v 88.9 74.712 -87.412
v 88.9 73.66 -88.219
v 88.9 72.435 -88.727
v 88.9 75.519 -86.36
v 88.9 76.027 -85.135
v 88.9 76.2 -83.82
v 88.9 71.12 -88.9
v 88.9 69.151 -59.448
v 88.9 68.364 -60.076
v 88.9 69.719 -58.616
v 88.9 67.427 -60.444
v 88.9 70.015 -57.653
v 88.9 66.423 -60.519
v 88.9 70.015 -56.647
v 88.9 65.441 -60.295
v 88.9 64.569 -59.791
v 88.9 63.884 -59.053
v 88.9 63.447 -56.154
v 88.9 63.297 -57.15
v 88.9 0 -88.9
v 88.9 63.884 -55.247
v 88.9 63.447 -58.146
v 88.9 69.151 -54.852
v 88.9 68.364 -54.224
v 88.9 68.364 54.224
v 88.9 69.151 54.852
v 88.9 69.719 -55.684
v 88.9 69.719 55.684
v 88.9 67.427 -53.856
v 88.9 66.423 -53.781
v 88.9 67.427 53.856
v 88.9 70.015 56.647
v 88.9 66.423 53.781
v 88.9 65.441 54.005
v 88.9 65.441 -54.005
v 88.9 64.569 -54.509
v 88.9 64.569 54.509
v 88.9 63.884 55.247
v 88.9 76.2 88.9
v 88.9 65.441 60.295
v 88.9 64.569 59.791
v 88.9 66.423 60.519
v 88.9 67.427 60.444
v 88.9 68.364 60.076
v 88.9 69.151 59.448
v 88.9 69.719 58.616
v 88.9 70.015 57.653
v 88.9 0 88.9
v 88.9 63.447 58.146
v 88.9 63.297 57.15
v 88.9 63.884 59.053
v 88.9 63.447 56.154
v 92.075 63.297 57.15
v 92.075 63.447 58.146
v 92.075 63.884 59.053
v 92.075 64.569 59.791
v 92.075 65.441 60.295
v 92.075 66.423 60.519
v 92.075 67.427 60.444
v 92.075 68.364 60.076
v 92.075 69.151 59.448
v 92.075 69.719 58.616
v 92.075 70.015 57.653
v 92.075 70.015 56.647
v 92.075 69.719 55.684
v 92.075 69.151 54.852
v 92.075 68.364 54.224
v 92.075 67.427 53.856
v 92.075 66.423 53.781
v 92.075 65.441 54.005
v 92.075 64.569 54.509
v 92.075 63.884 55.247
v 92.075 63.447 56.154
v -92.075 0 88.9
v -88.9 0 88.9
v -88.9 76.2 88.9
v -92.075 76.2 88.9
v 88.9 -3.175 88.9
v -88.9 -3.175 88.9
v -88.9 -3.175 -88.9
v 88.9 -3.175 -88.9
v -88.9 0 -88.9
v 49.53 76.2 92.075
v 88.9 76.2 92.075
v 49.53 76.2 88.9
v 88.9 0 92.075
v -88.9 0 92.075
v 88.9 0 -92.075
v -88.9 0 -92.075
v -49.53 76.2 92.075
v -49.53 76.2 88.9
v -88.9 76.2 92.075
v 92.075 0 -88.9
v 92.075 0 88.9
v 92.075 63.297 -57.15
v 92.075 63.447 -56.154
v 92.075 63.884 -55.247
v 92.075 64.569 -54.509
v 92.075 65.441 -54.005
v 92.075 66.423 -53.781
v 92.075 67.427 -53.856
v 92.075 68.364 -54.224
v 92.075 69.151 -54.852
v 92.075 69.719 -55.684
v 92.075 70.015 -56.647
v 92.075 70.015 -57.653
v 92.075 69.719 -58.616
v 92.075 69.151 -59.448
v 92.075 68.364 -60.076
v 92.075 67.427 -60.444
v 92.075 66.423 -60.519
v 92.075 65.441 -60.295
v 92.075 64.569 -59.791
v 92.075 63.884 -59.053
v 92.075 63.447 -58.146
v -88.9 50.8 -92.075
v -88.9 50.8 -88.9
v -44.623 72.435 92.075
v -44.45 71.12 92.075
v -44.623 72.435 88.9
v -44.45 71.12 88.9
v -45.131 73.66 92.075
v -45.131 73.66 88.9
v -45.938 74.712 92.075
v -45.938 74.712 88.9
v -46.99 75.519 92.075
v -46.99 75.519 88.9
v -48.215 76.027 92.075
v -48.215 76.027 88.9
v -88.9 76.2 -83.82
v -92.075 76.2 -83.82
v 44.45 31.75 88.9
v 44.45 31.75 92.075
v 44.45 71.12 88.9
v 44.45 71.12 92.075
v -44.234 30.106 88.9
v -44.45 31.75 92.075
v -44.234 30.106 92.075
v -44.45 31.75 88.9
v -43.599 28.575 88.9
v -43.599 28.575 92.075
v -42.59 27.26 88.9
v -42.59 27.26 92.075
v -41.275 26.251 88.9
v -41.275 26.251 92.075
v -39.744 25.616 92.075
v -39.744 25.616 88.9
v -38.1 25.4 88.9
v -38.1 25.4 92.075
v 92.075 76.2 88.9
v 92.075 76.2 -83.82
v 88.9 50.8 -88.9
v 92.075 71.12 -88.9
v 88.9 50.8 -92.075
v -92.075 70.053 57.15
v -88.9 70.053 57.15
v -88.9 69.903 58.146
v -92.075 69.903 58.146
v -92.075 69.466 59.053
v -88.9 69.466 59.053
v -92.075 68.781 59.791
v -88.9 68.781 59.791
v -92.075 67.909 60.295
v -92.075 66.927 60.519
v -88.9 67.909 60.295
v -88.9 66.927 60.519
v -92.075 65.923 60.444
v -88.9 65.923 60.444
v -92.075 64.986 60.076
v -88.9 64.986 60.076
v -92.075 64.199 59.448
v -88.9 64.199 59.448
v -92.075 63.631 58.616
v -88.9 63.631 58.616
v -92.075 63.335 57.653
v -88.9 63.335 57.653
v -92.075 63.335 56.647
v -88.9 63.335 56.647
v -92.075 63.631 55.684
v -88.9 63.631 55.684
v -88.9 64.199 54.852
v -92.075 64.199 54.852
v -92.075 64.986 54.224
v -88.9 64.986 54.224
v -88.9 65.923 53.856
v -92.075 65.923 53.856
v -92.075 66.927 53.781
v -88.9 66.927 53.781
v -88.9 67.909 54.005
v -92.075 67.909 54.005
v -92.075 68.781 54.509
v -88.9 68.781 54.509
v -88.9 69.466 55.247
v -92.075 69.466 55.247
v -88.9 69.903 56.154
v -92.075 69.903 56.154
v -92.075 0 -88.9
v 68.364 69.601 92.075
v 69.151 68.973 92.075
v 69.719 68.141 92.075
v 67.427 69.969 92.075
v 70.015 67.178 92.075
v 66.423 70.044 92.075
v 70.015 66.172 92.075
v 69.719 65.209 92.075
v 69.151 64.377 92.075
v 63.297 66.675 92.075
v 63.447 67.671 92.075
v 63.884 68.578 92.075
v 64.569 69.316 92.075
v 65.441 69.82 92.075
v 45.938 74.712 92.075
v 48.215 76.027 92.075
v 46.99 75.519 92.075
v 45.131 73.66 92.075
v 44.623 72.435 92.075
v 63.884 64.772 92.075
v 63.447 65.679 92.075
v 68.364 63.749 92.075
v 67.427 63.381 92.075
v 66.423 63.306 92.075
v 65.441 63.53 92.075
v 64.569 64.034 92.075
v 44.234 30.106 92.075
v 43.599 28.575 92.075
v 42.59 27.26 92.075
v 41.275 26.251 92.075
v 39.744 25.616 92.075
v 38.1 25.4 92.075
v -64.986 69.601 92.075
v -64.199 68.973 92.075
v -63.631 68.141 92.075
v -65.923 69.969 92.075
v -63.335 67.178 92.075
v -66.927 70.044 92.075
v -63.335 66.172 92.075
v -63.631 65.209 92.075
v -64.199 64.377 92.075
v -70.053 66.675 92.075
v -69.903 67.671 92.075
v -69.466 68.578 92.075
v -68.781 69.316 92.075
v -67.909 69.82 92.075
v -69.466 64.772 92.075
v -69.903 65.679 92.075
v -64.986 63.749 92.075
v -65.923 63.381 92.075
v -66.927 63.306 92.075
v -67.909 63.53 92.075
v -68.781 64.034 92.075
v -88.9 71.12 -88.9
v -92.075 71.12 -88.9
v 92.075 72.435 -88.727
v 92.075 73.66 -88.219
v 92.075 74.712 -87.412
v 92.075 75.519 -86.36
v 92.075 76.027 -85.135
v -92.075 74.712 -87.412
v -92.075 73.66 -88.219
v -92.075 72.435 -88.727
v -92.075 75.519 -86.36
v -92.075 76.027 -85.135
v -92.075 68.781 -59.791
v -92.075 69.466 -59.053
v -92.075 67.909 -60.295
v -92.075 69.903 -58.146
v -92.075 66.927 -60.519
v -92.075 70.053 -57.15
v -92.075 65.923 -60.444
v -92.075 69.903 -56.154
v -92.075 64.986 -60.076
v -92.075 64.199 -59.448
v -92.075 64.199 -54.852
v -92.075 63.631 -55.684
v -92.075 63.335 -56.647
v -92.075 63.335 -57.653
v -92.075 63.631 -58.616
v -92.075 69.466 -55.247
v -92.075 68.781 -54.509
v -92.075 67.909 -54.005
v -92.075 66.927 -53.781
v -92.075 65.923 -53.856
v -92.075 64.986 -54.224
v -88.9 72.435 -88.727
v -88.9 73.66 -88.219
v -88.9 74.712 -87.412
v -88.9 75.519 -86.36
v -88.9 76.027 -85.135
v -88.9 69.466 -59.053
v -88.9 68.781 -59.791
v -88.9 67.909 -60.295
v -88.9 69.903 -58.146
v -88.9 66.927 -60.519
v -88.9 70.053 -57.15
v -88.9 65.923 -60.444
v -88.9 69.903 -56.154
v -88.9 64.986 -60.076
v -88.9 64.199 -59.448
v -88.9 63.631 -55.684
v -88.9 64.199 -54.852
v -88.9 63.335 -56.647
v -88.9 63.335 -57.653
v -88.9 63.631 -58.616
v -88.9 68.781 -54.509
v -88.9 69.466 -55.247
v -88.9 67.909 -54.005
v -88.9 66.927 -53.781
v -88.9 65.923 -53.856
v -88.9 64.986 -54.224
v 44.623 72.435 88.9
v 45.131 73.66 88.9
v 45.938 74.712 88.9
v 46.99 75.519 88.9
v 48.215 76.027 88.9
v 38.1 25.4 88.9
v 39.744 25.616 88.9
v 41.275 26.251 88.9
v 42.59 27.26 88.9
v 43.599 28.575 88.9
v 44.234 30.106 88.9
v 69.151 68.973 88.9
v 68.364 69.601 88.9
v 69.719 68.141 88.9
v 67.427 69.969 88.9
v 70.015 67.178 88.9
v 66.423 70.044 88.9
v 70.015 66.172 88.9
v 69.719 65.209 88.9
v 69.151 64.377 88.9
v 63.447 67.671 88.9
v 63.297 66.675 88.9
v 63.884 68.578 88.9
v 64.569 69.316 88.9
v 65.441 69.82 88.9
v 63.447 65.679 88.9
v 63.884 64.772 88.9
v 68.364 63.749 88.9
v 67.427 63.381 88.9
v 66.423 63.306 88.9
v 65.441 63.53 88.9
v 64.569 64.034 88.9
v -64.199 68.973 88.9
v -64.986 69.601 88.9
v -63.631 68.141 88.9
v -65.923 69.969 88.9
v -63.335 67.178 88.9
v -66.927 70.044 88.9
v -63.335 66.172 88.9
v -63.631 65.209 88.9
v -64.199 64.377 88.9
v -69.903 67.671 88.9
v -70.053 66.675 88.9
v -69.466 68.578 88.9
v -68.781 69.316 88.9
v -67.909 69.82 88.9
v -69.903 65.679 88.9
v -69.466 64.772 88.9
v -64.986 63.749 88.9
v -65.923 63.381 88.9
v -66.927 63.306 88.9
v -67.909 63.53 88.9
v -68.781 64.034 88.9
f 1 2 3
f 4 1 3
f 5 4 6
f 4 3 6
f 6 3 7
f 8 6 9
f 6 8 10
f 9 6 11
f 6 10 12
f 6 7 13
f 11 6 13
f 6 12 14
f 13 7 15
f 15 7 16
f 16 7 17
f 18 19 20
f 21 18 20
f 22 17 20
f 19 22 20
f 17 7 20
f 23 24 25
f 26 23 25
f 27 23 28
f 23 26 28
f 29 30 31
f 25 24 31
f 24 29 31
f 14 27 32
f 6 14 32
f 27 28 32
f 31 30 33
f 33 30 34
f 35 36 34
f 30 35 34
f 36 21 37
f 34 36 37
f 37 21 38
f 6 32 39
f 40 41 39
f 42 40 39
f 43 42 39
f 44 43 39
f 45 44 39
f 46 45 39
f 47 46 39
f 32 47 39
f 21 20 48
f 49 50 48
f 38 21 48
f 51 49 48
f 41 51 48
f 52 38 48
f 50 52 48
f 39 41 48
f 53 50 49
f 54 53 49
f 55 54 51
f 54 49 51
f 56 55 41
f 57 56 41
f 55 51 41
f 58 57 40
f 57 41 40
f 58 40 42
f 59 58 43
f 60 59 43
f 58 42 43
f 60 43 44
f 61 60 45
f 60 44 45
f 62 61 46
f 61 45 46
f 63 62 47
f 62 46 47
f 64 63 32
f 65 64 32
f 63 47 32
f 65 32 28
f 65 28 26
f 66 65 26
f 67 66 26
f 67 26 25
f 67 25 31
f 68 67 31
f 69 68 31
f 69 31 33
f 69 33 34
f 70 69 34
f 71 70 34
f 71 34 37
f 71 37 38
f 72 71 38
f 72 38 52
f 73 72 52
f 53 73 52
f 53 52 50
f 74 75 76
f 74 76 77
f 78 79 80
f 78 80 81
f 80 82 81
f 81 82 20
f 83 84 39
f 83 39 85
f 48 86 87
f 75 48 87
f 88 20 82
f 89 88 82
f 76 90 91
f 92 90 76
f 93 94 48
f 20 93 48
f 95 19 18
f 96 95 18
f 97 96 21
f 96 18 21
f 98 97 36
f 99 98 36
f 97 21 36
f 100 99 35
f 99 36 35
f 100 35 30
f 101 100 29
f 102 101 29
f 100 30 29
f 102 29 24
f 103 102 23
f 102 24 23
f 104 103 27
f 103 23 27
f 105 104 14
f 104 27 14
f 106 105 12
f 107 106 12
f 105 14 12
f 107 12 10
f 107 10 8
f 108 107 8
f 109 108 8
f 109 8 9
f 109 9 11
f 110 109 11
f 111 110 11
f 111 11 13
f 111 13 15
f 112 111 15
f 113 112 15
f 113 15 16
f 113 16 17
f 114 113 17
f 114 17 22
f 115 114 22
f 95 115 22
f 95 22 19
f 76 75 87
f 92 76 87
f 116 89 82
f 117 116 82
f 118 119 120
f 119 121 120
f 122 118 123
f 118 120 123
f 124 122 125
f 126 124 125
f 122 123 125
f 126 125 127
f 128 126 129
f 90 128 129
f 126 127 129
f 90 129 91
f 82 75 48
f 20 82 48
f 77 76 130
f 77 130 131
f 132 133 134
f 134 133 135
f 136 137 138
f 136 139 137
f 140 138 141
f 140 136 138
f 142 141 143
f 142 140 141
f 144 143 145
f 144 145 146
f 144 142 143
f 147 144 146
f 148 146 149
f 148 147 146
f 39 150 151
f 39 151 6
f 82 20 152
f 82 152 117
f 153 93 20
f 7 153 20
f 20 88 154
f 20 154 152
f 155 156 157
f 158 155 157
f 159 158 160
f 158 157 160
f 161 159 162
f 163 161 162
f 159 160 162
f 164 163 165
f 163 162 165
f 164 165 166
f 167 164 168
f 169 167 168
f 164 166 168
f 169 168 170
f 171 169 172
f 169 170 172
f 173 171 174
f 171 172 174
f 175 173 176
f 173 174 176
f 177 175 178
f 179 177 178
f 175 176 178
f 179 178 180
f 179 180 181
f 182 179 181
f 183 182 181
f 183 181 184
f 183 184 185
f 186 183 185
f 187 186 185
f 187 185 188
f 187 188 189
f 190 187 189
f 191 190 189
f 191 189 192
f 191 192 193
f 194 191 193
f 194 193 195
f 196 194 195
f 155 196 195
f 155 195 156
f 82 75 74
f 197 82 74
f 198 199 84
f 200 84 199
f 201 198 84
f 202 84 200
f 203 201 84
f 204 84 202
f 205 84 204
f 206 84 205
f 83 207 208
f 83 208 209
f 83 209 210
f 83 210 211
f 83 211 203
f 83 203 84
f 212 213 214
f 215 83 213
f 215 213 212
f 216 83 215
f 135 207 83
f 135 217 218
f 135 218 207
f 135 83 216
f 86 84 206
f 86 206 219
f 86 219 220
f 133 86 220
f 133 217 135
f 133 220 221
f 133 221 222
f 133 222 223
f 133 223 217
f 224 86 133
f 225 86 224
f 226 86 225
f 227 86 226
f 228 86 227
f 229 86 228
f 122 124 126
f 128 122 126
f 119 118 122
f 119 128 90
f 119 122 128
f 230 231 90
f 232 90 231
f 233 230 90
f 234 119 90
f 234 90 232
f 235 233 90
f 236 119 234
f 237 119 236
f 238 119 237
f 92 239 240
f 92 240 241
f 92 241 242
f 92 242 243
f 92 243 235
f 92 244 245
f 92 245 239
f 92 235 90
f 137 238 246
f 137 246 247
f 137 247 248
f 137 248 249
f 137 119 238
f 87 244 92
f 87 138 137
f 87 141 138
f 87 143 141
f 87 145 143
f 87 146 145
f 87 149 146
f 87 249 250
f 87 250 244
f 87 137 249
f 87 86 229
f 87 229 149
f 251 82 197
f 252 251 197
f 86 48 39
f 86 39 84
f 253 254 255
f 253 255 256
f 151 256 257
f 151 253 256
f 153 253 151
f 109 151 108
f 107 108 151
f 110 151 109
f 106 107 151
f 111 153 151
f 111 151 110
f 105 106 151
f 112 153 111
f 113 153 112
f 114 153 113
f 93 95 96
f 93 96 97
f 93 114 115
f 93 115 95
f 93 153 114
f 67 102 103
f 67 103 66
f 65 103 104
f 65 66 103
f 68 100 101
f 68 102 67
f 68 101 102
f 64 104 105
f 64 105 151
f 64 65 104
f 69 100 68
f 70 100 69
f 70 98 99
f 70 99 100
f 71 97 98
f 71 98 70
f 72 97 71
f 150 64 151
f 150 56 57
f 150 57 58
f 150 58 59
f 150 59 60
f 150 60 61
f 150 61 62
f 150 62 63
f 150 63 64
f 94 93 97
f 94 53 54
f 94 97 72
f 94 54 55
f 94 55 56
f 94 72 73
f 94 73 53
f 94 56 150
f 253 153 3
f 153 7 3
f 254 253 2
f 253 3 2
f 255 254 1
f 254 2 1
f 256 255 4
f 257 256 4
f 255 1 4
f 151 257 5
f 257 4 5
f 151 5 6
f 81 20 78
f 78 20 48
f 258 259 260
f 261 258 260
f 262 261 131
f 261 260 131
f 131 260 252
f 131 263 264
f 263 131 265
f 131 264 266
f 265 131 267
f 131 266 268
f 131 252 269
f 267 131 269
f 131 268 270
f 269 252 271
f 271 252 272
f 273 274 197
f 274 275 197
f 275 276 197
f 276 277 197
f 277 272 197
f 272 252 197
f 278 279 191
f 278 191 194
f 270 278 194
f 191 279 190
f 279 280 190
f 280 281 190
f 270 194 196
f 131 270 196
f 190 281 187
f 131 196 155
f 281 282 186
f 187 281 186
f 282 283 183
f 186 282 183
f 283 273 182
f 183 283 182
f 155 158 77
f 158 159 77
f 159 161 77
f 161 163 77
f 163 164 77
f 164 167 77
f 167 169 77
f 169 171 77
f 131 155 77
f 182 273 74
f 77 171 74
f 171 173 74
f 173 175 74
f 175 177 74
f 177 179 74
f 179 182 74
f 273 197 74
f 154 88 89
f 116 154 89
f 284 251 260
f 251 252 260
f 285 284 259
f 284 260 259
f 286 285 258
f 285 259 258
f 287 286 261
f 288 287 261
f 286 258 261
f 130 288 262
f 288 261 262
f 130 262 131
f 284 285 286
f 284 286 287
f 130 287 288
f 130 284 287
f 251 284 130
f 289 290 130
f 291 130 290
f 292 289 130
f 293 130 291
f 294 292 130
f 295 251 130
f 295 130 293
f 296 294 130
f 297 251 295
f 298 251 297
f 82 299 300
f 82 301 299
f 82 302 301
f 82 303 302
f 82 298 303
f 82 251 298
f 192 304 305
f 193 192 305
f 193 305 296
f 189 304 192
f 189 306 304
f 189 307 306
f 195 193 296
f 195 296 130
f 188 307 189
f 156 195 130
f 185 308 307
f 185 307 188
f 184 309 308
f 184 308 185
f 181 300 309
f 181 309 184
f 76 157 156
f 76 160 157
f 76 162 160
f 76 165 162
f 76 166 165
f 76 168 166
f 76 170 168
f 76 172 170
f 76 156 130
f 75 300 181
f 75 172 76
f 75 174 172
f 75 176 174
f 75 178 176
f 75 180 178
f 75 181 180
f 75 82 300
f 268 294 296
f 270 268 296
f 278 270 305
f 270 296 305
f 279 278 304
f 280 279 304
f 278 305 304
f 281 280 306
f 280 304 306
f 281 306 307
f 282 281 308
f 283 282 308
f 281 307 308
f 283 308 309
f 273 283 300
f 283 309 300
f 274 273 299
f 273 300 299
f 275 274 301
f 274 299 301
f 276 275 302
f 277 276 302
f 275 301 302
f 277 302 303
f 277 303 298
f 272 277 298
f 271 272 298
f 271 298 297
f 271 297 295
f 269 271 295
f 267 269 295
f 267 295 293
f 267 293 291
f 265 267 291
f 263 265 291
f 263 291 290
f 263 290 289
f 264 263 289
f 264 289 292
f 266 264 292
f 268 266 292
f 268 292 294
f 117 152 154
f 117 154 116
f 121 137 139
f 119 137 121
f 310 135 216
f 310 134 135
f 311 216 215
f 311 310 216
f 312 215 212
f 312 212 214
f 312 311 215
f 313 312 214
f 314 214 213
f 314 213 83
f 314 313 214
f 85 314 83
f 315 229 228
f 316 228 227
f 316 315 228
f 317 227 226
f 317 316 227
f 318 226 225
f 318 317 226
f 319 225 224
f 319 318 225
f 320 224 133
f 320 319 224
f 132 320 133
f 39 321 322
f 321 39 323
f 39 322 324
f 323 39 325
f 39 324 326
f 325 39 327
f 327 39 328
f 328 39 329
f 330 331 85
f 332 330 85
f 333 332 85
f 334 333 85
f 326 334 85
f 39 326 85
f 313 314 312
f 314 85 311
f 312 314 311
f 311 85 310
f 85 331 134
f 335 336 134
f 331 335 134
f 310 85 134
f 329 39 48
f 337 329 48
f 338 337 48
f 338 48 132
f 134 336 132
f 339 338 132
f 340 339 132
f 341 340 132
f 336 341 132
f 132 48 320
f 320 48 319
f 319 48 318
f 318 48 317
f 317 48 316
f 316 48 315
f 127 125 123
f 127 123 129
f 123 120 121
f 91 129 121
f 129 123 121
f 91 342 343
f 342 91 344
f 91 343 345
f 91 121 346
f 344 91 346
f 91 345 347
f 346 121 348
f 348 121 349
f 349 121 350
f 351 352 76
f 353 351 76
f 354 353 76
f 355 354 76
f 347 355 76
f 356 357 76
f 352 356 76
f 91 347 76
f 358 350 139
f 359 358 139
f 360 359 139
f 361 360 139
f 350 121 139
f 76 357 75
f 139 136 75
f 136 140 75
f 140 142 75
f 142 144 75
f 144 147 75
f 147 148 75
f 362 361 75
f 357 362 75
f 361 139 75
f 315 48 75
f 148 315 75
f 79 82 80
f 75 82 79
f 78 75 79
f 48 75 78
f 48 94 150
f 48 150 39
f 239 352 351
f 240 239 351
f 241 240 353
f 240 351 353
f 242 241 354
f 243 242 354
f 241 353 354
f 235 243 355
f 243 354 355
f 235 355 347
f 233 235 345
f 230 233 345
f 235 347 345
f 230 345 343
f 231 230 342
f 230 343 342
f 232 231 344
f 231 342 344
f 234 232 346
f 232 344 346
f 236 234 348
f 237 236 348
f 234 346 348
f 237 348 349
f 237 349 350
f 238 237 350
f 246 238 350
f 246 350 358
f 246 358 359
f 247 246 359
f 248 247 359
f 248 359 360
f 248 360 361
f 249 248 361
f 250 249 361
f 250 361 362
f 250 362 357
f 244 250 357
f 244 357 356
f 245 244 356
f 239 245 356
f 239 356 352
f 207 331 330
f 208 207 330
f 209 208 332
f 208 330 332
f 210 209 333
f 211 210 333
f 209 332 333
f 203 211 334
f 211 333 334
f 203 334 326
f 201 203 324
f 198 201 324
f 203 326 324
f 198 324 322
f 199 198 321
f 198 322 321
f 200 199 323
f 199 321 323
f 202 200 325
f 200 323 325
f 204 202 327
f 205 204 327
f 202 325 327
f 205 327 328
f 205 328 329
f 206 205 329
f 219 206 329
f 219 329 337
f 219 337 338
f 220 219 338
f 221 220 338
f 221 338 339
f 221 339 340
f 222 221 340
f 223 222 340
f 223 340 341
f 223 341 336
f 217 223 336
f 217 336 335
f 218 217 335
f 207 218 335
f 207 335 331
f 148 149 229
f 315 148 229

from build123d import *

# Parameters (mm, degrees)
F0_W      = 177.8
F0_H      = 177.8
F1_DEPTH  = 3.175
F2_W      = 177.8
F2_H      = 3.175
F3_DEPTH  = 76.2
F2_W_2    = 3.175
F2_H_2    = 177.8
F4_W      = 177.8
F4_H      = 3.175
F5_DEPTH  = 50.8
F6_W      = 88.9
F6_H      = 101.6
F7_DEPTH  = 25.4
F8_R      = 6.35
F9_R      = 5.08
F10_R     = 5.08
F10_2_R   = 5.08
F12_D     = 6.7564
F12_DEPTH = 19.05
F12_TIP   = 2.0298273432
F14_D     = 6.7564
F14_DEPTH = 19.05
F14_TIP   = 2.0298273432
F16_D     = 6.7564
F16_DEPTH = 19.05
F16_TIP   = 2.0298273432


with BuildPart() as f1:
    # F0 (on Front) → F1 (new body)
    with BuildSketch(Plane.XZ):
        Rectangle(F0_W, F0_H)
    extrude(amount=F1_DEPTH)


with BuildPart() as f3:
    # F2 (on face) → F3 (new body)
    with BuildSketch(Plane(origin=(0, 0, 0), x_dir=(-1, 0, 0), z_dir=(0, 1, 0))):
        with Locations((0, 90.4875)):
            Rectangle(F2_W, F2_H)
    extrude(amount=F3_DEPTH)

    # F6 (on face) → F7 (cut)
    with BuildSketch(Plane.XY.offset(92.075)):
        with Locations((0, 76.2)):
            Rectangle(F6_W, F6_H)
    extrude(amount=-F7_DEPTH, mode=Mode.SUBTRACT)

    # F8
    f8_edges = [f3.edges().sort_by_distance(p)[0] for p in [
        (-44.45, 25.4, 90.4875),
        (44.45, 25.4, 90.4875),
    ]]
    fillet(f8_edges, radius=F8_R)

    # F9
    f9_edges = [f3.edges().sort_by_distance(p)[0] for p in [
        (-44.45, 76.2, 90.4875),
        (44.45, 76.2, 90.4875),
    ]]
    fillet(f9_edges, radius=F9_R)

    # F12
    with Locations(Plane.XY.offset(92.075)):
        with Locations((-66.675, 66.675), (66.675, 66.675)):
            Hole(F12_D / 2, depth=F12_DEPTH)
            with Locations((0, 0, -(F12_DEPTH + F12_TIP / 2))):  # 118° drill point
                Cone(0, F12_D / 2, F12_TIP, mode=Mode.SUBTRACT)


with BuildPart() as f3b:
    # F2 (on face) → F3, piece 2 (new body)
    with BuildSketch(Plane(origin=(0, 0, 0), x_dir=(-1, 0, 0), z_dir=(0, 1, 0))):
        with Locations((90.4875, 0)):
            Rectangle(F2_W_2, F2_H_2)
    extrude(amount=F3_DEPTH)

    # F10#2
    f10_2_edges = [f3b.edges().sort_by_distance(p)[0] for p in [
        (-90.4875, 76.2, -88.9),
    ]]
    fillet(f10_2_edges, radius=F10_2_R)

    # F16
    with Locations(Plane(origin=(-92.075, 0, 0), x_dir=(0, -1, 0), z_dir=(-1, 0, 0))):
        with Locations((-66.675, 57.15), (-66.675, -57.15)):
            Hole(F16_D / 2, depth=F16_DEPTH)
            with Locations((0, 0, -(F16_DEPTH + F16_TIP / 2))):  # 118° drill point
                Cone(0, F16_D / 2, F16_TIP, mode=Mode.SUBTRACT)


with BuildPart() as f3c:
    # F2 (on face) → F3, piece 3 (new body)
    with BuildSketch(Plane(origin=(0, 0, 0), x_dir=(-1, 0, 0), z_dir=(0, 1, 0))):
        with Locations((-90.4875, 0)):
            Rectangle(F2_W_2, F2_H_2)
    extrude(amount=F3_DEPTH)

    # F10
    f10_edges = [f3c.edges().sort_by_distance(p)[0] for p in [
        (90.4875, 76.2, -88.9),
    ]]
    fillet(f10_edges, radius=F10_R)

    # F14
    with Locations(Plane.YZ.offset(92.075)):
        with Locations((66.675, 57.15), (66.675, -57.15)):
            Hole(F14_D / 2, depth=F14_DEPTH)
            with Locations((0, 0, -(F14_DEPTH + F14_TIP / 2))):  # 118° drill point
                Cone(0, F14_D / 2, F14_TIP, mode=Mode.SUBTRACT)


with BuildPart() as f5:
    # F4 (on face) → F5 (new body)
    with BuildSketch(Plane(origin=(0, 0, 0), x_dir=(-1, 0, 0), z_dir=(0, 1, 0))):
        with Locations((0, -90.4875)):
            Rectangle(F4_W, F4_H)
    extrude(amount=F5_DEPTH)


solid = Compound([f1.part, f3.part, f3b.part, f3c.part, f5.part])
